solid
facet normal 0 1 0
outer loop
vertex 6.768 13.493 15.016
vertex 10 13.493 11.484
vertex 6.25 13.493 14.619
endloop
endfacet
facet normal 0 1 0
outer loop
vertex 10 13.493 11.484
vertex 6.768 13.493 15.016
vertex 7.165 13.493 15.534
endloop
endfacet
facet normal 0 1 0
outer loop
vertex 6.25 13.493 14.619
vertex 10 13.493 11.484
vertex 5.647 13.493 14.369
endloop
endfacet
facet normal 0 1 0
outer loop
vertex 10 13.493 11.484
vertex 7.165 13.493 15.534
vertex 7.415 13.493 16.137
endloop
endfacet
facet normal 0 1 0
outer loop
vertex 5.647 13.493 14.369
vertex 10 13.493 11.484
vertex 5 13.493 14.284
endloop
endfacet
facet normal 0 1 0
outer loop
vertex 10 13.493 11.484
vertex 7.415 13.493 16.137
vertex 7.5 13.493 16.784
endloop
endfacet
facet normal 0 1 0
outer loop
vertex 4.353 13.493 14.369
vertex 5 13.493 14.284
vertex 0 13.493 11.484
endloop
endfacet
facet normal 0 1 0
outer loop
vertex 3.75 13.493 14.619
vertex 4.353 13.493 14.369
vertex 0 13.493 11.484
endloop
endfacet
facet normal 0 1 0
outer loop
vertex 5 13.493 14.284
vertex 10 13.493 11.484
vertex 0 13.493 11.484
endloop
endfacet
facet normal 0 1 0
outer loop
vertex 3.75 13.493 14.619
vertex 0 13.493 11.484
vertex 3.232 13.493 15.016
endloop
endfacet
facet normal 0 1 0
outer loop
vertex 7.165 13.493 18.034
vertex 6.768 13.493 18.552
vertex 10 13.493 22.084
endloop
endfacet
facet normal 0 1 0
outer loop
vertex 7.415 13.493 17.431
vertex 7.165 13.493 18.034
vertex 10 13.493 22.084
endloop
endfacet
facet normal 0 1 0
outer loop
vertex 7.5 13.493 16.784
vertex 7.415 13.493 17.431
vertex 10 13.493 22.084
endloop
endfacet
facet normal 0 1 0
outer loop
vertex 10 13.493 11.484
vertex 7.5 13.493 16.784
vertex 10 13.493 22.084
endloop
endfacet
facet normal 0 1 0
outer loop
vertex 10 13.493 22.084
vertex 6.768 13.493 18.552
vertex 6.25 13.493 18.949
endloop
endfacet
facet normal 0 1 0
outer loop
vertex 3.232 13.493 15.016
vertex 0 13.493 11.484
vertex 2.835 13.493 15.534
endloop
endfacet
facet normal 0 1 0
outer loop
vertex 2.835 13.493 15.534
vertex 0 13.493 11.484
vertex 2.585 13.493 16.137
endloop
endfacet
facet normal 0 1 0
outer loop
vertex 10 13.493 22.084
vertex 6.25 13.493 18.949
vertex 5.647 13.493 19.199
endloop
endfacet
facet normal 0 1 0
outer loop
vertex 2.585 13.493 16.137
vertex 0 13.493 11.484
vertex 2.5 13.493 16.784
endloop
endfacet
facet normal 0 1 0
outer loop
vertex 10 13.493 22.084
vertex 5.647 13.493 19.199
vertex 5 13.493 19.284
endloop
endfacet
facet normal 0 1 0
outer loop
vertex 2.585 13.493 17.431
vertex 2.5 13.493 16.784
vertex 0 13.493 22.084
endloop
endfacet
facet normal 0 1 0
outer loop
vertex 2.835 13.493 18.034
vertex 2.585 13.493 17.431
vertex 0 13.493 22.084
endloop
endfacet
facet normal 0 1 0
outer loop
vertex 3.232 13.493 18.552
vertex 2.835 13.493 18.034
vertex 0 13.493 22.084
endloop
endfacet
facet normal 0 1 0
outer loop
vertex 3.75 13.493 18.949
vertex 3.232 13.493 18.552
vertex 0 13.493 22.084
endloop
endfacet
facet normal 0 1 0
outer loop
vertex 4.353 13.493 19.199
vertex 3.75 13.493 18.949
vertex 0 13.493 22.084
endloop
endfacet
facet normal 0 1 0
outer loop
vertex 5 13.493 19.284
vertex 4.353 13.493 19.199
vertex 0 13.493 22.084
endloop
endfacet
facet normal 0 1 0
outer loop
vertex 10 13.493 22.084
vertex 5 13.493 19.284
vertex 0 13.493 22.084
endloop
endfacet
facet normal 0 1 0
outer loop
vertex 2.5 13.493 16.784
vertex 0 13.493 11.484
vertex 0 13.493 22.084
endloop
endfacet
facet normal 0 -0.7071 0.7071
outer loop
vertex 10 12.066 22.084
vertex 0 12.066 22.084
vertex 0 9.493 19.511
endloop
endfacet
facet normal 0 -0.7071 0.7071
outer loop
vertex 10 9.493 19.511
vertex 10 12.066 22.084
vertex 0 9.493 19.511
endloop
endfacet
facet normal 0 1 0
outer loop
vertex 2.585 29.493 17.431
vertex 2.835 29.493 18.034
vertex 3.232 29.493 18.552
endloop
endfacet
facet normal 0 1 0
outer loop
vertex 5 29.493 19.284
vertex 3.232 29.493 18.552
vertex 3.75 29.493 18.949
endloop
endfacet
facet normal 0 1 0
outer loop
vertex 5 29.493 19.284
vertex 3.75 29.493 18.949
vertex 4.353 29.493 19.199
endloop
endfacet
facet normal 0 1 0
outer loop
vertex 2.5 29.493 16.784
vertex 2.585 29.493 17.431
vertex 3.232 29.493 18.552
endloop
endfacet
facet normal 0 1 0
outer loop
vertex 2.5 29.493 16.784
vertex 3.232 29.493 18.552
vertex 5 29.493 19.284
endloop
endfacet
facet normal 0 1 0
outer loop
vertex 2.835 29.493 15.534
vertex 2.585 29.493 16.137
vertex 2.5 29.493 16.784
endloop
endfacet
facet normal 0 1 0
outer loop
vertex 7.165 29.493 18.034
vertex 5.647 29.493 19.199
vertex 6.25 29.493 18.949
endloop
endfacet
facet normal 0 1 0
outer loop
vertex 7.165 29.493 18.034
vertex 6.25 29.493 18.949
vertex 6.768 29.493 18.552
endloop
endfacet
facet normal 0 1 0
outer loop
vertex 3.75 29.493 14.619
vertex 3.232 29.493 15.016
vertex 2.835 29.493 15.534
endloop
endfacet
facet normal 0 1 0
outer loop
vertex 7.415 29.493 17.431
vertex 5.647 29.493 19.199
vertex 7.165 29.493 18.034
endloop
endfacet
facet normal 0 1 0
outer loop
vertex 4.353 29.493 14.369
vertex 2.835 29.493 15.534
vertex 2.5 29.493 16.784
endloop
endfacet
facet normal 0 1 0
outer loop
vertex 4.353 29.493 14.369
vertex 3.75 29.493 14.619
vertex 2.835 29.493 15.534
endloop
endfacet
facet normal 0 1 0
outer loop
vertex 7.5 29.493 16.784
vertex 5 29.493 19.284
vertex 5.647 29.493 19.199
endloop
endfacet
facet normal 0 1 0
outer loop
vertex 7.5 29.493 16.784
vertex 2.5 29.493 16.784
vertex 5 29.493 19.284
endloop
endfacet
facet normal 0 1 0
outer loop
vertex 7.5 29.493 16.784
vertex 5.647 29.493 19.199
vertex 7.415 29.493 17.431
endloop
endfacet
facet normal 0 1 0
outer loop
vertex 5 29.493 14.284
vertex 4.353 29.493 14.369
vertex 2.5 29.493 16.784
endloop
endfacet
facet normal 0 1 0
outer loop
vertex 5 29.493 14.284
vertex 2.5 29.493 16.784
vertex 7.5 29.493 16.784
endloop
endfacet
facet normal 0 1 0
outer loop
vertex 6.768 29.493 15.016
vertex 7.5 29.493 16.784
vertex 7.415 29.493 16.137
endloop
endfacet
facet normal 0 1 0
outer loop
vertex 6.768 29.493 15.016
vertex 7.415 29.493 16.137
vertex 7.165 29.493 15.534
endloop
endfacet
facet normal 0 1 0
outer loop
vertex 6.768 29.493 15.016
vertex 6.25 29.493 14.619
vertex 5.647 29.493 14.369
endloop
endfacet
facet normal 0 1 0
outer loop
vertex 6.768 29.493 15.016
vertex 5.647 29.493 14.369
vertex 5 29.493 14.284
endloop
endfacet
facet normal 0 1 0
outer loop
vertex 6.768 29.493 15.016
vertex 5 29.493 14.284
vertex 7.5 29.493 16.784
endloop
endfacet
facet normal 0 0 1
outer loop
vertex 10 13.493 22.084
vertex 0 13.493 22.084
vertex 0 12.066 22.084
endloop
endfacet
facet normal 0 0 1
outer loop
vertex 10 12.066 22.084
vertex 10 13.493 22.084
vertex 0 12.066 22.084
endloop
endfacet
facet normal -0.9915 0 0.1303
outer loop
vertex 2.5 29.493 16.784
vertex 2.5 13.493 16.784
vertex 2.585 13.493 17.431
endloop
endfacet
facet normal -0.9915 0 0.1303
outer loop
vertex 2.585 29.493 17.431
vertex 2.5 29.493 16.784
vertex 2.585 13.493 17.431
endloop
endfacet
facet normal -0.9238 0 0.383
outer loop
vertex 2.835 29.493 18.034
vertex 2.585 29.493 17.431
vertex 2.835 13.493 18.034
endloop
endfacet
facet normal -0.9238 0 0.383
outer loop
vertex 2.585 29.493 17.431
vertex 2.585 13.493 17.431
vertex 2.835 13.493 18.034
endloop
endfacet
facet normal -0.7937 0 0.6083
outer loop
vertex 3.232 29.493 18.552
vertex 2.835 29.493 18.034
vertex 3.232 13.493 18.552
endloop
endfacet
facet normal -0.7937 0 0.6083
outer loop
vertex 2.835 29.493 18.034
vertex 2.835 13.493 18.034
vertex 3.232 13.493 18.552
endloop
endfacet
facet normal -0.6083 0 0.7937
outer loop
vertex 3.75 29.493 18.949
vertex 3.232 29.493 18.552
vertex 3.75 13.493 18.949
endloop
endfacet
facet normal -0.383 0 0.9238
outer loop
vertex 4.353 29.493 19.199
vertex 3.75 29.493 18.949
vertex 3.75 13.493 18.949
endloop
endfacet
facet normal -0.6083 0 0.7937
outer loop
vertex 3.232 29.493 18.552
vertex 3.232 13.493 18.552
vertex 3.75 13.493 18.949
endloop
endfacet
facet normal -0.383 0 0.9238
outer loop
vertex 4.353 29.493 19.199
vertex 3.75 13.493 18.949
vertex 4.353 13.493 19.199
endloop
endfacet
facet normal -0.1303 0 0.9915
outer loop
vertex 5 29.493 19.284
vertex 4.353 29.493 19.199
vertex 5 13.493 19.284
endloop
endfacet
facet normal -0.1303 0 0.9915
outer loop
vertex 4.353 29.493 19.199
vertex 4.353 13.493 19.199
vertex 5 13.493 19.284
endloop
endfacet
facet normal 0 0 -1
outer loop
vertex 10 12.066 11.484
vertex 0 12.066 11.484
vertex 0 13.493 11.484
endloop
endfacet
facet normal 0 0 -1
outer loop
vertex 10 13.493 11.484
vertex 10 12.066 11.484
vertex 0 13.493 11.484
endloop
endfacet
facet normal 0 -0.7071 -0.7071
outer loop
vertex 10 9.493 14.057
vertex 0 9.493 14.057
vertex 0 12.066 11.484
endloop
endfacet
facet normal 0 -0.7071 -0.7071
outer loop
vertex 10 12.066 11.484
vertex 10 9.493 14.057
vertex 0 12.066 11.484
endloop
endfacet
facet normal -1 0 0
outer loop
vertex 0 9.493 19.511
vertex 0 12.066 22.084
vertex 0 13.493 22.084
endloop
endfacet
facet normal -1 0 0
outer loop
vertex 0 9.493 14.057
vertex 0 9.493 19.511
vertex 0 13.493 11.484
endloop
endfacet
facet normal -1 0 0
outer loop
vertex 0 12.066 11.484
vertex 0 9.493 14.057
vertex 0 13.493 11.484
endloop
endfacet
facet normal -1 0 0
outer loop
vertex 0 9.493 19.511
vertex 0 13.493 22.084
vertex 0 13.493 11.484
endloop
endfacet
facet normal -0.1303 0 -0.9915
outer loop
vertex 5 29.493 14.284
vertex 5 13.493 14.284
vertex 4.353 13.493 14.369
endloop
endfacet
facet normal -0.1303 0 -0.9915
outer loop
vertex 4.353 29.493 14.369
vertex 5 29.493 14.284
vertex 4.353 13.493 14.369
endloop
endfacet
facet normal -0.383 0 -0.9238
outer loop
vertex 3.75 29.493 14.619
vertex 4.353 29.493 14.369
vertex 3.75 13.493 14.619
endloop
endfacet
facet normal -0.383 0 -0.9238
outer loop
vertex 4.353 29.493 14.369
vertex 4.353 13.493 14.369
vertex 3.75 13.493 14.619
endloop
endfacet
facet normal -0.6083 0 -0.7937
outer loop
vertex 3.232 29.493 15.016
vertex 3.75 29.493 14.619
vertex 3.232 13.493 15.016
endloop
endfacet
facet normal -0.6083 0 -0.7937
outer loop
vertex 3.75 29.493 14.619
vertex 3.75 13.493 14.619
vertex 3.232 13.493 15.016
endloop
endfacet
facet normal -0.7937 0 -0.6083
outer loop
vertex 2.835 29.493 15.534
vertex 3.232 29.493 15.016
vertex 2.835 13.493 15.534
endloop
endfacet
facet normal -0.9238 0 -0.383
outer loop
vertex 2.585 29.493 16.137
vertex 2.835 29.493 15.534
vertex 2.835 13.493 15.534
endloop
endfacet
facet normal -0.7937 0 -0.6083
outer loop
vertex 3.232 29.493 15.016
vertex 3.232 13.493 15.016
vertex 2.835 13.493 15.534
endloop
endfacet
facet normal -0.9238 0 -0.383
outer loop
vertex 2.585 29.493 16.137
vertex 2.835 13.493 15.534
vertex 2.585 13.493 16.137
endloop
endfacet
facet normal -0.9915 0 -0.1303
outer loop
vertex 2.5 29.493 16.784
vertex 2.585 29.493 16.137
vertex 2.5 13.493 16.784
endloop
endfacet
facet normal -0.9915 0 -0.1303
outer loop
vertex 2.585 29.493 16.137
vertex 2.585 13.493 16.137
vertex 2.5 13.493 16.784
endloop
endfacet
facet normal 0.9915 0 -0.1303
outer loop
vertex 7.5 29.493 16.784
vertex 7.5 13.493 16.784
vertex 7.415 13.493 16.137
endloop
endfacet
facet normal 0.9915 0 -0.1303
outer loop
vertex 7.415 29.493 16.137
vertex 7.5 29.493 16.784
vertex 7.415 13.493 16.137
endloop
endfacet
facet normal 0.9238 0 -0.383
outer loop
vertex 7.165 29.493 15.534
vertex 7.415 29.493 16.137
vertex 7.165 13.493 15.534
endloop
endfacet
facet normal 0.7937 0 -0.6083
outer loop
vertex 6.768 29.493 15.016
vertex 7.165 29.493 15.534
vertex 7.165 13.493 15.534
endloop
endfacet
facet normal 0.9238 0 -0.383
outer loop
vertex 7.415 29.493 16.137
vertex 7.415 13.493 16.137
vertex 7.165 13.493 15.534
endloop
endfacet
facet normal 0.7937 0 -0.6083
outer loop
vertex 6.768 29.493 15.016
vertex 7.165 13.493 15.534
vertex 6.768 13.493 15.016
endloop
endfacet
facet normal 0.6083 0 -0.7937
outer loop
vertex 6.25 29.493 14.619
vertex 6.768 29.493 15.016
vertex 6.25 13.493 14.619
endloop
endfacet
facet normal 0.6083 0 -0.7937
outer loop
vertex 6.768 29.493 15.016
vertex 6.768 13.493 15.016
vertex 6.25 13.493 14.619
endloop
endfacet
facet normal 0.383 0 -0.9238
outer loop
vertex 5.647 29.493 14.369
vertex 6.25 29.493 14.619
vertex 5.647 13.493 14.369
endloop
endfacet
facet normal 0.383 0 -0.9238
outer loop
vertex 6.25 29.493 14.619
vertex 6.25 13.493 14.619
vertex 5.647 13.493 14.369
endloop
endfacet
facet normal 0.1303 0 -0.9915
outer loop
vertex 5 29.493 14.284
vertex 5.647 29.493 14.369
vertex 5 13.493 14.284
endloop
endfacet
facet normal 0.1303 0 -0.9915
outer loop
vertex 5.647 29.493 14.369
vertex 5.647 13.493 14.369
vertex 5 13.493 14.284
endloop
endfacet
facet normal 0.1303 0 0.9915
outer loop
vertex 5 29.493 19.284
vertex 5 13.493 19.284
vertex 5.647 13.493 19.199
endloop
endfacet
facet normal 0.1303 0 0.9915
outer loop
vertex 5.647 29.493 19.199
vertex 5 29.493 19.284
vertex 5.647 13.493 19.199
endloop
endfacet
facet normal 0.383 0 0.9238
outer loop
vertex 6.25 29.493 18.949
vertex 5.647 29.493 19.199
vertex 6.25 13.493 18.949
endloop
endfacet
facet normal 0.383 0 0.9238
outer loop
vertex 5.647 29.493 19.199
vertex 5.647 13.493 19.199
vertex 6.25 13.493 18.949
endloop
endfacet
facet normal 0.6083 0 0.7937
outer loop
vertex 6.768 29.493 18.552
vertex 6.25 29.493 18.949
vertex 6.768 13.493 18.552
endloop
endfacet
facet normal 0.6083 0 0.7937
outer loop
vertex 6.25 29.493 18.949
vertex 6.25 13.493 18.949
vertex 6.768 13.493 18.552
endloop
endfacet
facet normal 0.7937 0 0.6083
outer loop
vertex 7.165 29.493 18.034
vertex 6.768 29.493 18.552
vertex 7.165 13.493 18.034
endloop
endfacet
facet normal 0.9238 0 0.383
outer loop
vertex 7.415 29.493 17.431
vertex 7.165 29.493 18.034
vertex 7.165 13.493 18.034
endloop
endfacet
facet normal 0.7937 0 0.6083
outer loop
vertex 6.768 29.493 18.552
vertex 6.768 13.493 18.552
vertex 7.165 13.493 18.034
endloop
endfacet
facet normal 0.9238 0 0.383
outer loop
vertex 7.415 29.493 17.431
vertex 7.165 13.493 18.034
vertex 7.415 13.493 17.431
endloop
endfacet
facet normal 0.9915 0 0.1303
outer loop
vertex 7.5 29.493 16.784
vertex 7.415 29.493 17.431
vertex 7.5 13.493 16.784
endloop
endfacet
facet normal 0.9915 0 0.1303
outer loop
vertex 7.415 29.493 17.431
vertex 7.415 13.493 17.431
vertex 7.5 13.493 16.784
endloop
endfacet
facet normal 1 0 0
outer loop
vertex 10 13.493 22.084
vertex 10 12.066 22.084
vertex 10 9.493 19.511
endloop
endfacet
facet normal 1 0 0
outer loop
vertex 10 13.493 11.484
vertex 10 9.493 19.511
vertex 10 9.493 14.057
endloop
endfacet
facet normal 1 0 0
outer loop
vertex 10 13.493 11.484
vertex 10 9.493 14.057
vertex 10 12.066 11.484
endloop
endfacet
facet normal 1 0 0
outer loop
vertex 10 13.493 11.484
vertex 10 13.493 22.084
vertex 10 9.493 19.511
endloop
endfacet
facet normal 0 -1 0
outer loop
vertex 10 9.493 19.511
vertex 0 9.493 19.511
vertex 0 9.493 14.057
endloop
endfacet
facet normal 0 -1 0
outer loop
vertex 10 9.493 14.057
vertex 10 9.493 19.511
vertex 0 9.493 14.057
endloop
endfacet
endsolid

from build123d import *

# Parameters (mm, degrees)
BOSS_EXTRUDE1_DEPTH = 10
BOSS_EXTRUDE2_DEPTH = 16


with BuildPart() as part:
    # Sketch1 → Boss-Extrude1 (new body)
    with BuildSketch(Plane(origin=(0, 0, 0), x_dir=(0, 0, -1), z_dir=(1, 0, 0))):
        Polygon((-19.511221689, 9.49340082), (-14.056806101, 9.49340082), (-11.484013895, 12.066193026), (-11.484013895, 13.49340082), (-13.684013895, 13.49340082), (-19.884013895, 13.49340082), (-22.084013895, 13.49340082), (-22.084013895, 12.066193026), align=None)
    extrude(amount=BOSS_EXTRUDE1_DEPTH)

    # Sketch2 → Boss-Extrude2 (add)
    with BuildSketch(Plane(origin=(0, 13.49340082, 0), x_dir=(1, 0, 0), z_dir=(0, 1, 0))):
        with BuildLine():
            ThreePointArc((7.5, -16.784013895), (6.767766953, -15.016246942), (5, -14.284013895))
            Line((5, -14.284013895), (5, -16.784013895))
            Line((5, -16.784013895), (7.5, -16.784013895))
        make_face()
        with BuildLine():
            Line((5, -16.784013895), (5, -14.284013895))
            ThreePointArc((5, -14.284013895), (3.232233047, -15.016246942), (2.5, -16.784013895))
            Line((2.5, -16.784013895), (5, -16.784013895))
        make_face()
        with BuildLine():
            Line((7.5, -16.784013895), (5, -16.784013895))
            Line((5, -16.784013895), (5, -19.284013895))
            ThreePointArc((5, -19.284013895), (6.767766953, -18.551780848), (7.5, -16.784013895))
        make_face()
        with BuildLine():
            Line((5, -19.284013895), (5, -16.784013895))
            Line((5, -16.784013895), (2.5, -16.784013895))
            ThreePointArc((2.5, -16.784013895), (3.232233047, -18.551780848), (5, -19.284013895))
        make_face()
    extrude(amount=BOSS_EXTRUDE2_DEPTH)


solid = part.part
